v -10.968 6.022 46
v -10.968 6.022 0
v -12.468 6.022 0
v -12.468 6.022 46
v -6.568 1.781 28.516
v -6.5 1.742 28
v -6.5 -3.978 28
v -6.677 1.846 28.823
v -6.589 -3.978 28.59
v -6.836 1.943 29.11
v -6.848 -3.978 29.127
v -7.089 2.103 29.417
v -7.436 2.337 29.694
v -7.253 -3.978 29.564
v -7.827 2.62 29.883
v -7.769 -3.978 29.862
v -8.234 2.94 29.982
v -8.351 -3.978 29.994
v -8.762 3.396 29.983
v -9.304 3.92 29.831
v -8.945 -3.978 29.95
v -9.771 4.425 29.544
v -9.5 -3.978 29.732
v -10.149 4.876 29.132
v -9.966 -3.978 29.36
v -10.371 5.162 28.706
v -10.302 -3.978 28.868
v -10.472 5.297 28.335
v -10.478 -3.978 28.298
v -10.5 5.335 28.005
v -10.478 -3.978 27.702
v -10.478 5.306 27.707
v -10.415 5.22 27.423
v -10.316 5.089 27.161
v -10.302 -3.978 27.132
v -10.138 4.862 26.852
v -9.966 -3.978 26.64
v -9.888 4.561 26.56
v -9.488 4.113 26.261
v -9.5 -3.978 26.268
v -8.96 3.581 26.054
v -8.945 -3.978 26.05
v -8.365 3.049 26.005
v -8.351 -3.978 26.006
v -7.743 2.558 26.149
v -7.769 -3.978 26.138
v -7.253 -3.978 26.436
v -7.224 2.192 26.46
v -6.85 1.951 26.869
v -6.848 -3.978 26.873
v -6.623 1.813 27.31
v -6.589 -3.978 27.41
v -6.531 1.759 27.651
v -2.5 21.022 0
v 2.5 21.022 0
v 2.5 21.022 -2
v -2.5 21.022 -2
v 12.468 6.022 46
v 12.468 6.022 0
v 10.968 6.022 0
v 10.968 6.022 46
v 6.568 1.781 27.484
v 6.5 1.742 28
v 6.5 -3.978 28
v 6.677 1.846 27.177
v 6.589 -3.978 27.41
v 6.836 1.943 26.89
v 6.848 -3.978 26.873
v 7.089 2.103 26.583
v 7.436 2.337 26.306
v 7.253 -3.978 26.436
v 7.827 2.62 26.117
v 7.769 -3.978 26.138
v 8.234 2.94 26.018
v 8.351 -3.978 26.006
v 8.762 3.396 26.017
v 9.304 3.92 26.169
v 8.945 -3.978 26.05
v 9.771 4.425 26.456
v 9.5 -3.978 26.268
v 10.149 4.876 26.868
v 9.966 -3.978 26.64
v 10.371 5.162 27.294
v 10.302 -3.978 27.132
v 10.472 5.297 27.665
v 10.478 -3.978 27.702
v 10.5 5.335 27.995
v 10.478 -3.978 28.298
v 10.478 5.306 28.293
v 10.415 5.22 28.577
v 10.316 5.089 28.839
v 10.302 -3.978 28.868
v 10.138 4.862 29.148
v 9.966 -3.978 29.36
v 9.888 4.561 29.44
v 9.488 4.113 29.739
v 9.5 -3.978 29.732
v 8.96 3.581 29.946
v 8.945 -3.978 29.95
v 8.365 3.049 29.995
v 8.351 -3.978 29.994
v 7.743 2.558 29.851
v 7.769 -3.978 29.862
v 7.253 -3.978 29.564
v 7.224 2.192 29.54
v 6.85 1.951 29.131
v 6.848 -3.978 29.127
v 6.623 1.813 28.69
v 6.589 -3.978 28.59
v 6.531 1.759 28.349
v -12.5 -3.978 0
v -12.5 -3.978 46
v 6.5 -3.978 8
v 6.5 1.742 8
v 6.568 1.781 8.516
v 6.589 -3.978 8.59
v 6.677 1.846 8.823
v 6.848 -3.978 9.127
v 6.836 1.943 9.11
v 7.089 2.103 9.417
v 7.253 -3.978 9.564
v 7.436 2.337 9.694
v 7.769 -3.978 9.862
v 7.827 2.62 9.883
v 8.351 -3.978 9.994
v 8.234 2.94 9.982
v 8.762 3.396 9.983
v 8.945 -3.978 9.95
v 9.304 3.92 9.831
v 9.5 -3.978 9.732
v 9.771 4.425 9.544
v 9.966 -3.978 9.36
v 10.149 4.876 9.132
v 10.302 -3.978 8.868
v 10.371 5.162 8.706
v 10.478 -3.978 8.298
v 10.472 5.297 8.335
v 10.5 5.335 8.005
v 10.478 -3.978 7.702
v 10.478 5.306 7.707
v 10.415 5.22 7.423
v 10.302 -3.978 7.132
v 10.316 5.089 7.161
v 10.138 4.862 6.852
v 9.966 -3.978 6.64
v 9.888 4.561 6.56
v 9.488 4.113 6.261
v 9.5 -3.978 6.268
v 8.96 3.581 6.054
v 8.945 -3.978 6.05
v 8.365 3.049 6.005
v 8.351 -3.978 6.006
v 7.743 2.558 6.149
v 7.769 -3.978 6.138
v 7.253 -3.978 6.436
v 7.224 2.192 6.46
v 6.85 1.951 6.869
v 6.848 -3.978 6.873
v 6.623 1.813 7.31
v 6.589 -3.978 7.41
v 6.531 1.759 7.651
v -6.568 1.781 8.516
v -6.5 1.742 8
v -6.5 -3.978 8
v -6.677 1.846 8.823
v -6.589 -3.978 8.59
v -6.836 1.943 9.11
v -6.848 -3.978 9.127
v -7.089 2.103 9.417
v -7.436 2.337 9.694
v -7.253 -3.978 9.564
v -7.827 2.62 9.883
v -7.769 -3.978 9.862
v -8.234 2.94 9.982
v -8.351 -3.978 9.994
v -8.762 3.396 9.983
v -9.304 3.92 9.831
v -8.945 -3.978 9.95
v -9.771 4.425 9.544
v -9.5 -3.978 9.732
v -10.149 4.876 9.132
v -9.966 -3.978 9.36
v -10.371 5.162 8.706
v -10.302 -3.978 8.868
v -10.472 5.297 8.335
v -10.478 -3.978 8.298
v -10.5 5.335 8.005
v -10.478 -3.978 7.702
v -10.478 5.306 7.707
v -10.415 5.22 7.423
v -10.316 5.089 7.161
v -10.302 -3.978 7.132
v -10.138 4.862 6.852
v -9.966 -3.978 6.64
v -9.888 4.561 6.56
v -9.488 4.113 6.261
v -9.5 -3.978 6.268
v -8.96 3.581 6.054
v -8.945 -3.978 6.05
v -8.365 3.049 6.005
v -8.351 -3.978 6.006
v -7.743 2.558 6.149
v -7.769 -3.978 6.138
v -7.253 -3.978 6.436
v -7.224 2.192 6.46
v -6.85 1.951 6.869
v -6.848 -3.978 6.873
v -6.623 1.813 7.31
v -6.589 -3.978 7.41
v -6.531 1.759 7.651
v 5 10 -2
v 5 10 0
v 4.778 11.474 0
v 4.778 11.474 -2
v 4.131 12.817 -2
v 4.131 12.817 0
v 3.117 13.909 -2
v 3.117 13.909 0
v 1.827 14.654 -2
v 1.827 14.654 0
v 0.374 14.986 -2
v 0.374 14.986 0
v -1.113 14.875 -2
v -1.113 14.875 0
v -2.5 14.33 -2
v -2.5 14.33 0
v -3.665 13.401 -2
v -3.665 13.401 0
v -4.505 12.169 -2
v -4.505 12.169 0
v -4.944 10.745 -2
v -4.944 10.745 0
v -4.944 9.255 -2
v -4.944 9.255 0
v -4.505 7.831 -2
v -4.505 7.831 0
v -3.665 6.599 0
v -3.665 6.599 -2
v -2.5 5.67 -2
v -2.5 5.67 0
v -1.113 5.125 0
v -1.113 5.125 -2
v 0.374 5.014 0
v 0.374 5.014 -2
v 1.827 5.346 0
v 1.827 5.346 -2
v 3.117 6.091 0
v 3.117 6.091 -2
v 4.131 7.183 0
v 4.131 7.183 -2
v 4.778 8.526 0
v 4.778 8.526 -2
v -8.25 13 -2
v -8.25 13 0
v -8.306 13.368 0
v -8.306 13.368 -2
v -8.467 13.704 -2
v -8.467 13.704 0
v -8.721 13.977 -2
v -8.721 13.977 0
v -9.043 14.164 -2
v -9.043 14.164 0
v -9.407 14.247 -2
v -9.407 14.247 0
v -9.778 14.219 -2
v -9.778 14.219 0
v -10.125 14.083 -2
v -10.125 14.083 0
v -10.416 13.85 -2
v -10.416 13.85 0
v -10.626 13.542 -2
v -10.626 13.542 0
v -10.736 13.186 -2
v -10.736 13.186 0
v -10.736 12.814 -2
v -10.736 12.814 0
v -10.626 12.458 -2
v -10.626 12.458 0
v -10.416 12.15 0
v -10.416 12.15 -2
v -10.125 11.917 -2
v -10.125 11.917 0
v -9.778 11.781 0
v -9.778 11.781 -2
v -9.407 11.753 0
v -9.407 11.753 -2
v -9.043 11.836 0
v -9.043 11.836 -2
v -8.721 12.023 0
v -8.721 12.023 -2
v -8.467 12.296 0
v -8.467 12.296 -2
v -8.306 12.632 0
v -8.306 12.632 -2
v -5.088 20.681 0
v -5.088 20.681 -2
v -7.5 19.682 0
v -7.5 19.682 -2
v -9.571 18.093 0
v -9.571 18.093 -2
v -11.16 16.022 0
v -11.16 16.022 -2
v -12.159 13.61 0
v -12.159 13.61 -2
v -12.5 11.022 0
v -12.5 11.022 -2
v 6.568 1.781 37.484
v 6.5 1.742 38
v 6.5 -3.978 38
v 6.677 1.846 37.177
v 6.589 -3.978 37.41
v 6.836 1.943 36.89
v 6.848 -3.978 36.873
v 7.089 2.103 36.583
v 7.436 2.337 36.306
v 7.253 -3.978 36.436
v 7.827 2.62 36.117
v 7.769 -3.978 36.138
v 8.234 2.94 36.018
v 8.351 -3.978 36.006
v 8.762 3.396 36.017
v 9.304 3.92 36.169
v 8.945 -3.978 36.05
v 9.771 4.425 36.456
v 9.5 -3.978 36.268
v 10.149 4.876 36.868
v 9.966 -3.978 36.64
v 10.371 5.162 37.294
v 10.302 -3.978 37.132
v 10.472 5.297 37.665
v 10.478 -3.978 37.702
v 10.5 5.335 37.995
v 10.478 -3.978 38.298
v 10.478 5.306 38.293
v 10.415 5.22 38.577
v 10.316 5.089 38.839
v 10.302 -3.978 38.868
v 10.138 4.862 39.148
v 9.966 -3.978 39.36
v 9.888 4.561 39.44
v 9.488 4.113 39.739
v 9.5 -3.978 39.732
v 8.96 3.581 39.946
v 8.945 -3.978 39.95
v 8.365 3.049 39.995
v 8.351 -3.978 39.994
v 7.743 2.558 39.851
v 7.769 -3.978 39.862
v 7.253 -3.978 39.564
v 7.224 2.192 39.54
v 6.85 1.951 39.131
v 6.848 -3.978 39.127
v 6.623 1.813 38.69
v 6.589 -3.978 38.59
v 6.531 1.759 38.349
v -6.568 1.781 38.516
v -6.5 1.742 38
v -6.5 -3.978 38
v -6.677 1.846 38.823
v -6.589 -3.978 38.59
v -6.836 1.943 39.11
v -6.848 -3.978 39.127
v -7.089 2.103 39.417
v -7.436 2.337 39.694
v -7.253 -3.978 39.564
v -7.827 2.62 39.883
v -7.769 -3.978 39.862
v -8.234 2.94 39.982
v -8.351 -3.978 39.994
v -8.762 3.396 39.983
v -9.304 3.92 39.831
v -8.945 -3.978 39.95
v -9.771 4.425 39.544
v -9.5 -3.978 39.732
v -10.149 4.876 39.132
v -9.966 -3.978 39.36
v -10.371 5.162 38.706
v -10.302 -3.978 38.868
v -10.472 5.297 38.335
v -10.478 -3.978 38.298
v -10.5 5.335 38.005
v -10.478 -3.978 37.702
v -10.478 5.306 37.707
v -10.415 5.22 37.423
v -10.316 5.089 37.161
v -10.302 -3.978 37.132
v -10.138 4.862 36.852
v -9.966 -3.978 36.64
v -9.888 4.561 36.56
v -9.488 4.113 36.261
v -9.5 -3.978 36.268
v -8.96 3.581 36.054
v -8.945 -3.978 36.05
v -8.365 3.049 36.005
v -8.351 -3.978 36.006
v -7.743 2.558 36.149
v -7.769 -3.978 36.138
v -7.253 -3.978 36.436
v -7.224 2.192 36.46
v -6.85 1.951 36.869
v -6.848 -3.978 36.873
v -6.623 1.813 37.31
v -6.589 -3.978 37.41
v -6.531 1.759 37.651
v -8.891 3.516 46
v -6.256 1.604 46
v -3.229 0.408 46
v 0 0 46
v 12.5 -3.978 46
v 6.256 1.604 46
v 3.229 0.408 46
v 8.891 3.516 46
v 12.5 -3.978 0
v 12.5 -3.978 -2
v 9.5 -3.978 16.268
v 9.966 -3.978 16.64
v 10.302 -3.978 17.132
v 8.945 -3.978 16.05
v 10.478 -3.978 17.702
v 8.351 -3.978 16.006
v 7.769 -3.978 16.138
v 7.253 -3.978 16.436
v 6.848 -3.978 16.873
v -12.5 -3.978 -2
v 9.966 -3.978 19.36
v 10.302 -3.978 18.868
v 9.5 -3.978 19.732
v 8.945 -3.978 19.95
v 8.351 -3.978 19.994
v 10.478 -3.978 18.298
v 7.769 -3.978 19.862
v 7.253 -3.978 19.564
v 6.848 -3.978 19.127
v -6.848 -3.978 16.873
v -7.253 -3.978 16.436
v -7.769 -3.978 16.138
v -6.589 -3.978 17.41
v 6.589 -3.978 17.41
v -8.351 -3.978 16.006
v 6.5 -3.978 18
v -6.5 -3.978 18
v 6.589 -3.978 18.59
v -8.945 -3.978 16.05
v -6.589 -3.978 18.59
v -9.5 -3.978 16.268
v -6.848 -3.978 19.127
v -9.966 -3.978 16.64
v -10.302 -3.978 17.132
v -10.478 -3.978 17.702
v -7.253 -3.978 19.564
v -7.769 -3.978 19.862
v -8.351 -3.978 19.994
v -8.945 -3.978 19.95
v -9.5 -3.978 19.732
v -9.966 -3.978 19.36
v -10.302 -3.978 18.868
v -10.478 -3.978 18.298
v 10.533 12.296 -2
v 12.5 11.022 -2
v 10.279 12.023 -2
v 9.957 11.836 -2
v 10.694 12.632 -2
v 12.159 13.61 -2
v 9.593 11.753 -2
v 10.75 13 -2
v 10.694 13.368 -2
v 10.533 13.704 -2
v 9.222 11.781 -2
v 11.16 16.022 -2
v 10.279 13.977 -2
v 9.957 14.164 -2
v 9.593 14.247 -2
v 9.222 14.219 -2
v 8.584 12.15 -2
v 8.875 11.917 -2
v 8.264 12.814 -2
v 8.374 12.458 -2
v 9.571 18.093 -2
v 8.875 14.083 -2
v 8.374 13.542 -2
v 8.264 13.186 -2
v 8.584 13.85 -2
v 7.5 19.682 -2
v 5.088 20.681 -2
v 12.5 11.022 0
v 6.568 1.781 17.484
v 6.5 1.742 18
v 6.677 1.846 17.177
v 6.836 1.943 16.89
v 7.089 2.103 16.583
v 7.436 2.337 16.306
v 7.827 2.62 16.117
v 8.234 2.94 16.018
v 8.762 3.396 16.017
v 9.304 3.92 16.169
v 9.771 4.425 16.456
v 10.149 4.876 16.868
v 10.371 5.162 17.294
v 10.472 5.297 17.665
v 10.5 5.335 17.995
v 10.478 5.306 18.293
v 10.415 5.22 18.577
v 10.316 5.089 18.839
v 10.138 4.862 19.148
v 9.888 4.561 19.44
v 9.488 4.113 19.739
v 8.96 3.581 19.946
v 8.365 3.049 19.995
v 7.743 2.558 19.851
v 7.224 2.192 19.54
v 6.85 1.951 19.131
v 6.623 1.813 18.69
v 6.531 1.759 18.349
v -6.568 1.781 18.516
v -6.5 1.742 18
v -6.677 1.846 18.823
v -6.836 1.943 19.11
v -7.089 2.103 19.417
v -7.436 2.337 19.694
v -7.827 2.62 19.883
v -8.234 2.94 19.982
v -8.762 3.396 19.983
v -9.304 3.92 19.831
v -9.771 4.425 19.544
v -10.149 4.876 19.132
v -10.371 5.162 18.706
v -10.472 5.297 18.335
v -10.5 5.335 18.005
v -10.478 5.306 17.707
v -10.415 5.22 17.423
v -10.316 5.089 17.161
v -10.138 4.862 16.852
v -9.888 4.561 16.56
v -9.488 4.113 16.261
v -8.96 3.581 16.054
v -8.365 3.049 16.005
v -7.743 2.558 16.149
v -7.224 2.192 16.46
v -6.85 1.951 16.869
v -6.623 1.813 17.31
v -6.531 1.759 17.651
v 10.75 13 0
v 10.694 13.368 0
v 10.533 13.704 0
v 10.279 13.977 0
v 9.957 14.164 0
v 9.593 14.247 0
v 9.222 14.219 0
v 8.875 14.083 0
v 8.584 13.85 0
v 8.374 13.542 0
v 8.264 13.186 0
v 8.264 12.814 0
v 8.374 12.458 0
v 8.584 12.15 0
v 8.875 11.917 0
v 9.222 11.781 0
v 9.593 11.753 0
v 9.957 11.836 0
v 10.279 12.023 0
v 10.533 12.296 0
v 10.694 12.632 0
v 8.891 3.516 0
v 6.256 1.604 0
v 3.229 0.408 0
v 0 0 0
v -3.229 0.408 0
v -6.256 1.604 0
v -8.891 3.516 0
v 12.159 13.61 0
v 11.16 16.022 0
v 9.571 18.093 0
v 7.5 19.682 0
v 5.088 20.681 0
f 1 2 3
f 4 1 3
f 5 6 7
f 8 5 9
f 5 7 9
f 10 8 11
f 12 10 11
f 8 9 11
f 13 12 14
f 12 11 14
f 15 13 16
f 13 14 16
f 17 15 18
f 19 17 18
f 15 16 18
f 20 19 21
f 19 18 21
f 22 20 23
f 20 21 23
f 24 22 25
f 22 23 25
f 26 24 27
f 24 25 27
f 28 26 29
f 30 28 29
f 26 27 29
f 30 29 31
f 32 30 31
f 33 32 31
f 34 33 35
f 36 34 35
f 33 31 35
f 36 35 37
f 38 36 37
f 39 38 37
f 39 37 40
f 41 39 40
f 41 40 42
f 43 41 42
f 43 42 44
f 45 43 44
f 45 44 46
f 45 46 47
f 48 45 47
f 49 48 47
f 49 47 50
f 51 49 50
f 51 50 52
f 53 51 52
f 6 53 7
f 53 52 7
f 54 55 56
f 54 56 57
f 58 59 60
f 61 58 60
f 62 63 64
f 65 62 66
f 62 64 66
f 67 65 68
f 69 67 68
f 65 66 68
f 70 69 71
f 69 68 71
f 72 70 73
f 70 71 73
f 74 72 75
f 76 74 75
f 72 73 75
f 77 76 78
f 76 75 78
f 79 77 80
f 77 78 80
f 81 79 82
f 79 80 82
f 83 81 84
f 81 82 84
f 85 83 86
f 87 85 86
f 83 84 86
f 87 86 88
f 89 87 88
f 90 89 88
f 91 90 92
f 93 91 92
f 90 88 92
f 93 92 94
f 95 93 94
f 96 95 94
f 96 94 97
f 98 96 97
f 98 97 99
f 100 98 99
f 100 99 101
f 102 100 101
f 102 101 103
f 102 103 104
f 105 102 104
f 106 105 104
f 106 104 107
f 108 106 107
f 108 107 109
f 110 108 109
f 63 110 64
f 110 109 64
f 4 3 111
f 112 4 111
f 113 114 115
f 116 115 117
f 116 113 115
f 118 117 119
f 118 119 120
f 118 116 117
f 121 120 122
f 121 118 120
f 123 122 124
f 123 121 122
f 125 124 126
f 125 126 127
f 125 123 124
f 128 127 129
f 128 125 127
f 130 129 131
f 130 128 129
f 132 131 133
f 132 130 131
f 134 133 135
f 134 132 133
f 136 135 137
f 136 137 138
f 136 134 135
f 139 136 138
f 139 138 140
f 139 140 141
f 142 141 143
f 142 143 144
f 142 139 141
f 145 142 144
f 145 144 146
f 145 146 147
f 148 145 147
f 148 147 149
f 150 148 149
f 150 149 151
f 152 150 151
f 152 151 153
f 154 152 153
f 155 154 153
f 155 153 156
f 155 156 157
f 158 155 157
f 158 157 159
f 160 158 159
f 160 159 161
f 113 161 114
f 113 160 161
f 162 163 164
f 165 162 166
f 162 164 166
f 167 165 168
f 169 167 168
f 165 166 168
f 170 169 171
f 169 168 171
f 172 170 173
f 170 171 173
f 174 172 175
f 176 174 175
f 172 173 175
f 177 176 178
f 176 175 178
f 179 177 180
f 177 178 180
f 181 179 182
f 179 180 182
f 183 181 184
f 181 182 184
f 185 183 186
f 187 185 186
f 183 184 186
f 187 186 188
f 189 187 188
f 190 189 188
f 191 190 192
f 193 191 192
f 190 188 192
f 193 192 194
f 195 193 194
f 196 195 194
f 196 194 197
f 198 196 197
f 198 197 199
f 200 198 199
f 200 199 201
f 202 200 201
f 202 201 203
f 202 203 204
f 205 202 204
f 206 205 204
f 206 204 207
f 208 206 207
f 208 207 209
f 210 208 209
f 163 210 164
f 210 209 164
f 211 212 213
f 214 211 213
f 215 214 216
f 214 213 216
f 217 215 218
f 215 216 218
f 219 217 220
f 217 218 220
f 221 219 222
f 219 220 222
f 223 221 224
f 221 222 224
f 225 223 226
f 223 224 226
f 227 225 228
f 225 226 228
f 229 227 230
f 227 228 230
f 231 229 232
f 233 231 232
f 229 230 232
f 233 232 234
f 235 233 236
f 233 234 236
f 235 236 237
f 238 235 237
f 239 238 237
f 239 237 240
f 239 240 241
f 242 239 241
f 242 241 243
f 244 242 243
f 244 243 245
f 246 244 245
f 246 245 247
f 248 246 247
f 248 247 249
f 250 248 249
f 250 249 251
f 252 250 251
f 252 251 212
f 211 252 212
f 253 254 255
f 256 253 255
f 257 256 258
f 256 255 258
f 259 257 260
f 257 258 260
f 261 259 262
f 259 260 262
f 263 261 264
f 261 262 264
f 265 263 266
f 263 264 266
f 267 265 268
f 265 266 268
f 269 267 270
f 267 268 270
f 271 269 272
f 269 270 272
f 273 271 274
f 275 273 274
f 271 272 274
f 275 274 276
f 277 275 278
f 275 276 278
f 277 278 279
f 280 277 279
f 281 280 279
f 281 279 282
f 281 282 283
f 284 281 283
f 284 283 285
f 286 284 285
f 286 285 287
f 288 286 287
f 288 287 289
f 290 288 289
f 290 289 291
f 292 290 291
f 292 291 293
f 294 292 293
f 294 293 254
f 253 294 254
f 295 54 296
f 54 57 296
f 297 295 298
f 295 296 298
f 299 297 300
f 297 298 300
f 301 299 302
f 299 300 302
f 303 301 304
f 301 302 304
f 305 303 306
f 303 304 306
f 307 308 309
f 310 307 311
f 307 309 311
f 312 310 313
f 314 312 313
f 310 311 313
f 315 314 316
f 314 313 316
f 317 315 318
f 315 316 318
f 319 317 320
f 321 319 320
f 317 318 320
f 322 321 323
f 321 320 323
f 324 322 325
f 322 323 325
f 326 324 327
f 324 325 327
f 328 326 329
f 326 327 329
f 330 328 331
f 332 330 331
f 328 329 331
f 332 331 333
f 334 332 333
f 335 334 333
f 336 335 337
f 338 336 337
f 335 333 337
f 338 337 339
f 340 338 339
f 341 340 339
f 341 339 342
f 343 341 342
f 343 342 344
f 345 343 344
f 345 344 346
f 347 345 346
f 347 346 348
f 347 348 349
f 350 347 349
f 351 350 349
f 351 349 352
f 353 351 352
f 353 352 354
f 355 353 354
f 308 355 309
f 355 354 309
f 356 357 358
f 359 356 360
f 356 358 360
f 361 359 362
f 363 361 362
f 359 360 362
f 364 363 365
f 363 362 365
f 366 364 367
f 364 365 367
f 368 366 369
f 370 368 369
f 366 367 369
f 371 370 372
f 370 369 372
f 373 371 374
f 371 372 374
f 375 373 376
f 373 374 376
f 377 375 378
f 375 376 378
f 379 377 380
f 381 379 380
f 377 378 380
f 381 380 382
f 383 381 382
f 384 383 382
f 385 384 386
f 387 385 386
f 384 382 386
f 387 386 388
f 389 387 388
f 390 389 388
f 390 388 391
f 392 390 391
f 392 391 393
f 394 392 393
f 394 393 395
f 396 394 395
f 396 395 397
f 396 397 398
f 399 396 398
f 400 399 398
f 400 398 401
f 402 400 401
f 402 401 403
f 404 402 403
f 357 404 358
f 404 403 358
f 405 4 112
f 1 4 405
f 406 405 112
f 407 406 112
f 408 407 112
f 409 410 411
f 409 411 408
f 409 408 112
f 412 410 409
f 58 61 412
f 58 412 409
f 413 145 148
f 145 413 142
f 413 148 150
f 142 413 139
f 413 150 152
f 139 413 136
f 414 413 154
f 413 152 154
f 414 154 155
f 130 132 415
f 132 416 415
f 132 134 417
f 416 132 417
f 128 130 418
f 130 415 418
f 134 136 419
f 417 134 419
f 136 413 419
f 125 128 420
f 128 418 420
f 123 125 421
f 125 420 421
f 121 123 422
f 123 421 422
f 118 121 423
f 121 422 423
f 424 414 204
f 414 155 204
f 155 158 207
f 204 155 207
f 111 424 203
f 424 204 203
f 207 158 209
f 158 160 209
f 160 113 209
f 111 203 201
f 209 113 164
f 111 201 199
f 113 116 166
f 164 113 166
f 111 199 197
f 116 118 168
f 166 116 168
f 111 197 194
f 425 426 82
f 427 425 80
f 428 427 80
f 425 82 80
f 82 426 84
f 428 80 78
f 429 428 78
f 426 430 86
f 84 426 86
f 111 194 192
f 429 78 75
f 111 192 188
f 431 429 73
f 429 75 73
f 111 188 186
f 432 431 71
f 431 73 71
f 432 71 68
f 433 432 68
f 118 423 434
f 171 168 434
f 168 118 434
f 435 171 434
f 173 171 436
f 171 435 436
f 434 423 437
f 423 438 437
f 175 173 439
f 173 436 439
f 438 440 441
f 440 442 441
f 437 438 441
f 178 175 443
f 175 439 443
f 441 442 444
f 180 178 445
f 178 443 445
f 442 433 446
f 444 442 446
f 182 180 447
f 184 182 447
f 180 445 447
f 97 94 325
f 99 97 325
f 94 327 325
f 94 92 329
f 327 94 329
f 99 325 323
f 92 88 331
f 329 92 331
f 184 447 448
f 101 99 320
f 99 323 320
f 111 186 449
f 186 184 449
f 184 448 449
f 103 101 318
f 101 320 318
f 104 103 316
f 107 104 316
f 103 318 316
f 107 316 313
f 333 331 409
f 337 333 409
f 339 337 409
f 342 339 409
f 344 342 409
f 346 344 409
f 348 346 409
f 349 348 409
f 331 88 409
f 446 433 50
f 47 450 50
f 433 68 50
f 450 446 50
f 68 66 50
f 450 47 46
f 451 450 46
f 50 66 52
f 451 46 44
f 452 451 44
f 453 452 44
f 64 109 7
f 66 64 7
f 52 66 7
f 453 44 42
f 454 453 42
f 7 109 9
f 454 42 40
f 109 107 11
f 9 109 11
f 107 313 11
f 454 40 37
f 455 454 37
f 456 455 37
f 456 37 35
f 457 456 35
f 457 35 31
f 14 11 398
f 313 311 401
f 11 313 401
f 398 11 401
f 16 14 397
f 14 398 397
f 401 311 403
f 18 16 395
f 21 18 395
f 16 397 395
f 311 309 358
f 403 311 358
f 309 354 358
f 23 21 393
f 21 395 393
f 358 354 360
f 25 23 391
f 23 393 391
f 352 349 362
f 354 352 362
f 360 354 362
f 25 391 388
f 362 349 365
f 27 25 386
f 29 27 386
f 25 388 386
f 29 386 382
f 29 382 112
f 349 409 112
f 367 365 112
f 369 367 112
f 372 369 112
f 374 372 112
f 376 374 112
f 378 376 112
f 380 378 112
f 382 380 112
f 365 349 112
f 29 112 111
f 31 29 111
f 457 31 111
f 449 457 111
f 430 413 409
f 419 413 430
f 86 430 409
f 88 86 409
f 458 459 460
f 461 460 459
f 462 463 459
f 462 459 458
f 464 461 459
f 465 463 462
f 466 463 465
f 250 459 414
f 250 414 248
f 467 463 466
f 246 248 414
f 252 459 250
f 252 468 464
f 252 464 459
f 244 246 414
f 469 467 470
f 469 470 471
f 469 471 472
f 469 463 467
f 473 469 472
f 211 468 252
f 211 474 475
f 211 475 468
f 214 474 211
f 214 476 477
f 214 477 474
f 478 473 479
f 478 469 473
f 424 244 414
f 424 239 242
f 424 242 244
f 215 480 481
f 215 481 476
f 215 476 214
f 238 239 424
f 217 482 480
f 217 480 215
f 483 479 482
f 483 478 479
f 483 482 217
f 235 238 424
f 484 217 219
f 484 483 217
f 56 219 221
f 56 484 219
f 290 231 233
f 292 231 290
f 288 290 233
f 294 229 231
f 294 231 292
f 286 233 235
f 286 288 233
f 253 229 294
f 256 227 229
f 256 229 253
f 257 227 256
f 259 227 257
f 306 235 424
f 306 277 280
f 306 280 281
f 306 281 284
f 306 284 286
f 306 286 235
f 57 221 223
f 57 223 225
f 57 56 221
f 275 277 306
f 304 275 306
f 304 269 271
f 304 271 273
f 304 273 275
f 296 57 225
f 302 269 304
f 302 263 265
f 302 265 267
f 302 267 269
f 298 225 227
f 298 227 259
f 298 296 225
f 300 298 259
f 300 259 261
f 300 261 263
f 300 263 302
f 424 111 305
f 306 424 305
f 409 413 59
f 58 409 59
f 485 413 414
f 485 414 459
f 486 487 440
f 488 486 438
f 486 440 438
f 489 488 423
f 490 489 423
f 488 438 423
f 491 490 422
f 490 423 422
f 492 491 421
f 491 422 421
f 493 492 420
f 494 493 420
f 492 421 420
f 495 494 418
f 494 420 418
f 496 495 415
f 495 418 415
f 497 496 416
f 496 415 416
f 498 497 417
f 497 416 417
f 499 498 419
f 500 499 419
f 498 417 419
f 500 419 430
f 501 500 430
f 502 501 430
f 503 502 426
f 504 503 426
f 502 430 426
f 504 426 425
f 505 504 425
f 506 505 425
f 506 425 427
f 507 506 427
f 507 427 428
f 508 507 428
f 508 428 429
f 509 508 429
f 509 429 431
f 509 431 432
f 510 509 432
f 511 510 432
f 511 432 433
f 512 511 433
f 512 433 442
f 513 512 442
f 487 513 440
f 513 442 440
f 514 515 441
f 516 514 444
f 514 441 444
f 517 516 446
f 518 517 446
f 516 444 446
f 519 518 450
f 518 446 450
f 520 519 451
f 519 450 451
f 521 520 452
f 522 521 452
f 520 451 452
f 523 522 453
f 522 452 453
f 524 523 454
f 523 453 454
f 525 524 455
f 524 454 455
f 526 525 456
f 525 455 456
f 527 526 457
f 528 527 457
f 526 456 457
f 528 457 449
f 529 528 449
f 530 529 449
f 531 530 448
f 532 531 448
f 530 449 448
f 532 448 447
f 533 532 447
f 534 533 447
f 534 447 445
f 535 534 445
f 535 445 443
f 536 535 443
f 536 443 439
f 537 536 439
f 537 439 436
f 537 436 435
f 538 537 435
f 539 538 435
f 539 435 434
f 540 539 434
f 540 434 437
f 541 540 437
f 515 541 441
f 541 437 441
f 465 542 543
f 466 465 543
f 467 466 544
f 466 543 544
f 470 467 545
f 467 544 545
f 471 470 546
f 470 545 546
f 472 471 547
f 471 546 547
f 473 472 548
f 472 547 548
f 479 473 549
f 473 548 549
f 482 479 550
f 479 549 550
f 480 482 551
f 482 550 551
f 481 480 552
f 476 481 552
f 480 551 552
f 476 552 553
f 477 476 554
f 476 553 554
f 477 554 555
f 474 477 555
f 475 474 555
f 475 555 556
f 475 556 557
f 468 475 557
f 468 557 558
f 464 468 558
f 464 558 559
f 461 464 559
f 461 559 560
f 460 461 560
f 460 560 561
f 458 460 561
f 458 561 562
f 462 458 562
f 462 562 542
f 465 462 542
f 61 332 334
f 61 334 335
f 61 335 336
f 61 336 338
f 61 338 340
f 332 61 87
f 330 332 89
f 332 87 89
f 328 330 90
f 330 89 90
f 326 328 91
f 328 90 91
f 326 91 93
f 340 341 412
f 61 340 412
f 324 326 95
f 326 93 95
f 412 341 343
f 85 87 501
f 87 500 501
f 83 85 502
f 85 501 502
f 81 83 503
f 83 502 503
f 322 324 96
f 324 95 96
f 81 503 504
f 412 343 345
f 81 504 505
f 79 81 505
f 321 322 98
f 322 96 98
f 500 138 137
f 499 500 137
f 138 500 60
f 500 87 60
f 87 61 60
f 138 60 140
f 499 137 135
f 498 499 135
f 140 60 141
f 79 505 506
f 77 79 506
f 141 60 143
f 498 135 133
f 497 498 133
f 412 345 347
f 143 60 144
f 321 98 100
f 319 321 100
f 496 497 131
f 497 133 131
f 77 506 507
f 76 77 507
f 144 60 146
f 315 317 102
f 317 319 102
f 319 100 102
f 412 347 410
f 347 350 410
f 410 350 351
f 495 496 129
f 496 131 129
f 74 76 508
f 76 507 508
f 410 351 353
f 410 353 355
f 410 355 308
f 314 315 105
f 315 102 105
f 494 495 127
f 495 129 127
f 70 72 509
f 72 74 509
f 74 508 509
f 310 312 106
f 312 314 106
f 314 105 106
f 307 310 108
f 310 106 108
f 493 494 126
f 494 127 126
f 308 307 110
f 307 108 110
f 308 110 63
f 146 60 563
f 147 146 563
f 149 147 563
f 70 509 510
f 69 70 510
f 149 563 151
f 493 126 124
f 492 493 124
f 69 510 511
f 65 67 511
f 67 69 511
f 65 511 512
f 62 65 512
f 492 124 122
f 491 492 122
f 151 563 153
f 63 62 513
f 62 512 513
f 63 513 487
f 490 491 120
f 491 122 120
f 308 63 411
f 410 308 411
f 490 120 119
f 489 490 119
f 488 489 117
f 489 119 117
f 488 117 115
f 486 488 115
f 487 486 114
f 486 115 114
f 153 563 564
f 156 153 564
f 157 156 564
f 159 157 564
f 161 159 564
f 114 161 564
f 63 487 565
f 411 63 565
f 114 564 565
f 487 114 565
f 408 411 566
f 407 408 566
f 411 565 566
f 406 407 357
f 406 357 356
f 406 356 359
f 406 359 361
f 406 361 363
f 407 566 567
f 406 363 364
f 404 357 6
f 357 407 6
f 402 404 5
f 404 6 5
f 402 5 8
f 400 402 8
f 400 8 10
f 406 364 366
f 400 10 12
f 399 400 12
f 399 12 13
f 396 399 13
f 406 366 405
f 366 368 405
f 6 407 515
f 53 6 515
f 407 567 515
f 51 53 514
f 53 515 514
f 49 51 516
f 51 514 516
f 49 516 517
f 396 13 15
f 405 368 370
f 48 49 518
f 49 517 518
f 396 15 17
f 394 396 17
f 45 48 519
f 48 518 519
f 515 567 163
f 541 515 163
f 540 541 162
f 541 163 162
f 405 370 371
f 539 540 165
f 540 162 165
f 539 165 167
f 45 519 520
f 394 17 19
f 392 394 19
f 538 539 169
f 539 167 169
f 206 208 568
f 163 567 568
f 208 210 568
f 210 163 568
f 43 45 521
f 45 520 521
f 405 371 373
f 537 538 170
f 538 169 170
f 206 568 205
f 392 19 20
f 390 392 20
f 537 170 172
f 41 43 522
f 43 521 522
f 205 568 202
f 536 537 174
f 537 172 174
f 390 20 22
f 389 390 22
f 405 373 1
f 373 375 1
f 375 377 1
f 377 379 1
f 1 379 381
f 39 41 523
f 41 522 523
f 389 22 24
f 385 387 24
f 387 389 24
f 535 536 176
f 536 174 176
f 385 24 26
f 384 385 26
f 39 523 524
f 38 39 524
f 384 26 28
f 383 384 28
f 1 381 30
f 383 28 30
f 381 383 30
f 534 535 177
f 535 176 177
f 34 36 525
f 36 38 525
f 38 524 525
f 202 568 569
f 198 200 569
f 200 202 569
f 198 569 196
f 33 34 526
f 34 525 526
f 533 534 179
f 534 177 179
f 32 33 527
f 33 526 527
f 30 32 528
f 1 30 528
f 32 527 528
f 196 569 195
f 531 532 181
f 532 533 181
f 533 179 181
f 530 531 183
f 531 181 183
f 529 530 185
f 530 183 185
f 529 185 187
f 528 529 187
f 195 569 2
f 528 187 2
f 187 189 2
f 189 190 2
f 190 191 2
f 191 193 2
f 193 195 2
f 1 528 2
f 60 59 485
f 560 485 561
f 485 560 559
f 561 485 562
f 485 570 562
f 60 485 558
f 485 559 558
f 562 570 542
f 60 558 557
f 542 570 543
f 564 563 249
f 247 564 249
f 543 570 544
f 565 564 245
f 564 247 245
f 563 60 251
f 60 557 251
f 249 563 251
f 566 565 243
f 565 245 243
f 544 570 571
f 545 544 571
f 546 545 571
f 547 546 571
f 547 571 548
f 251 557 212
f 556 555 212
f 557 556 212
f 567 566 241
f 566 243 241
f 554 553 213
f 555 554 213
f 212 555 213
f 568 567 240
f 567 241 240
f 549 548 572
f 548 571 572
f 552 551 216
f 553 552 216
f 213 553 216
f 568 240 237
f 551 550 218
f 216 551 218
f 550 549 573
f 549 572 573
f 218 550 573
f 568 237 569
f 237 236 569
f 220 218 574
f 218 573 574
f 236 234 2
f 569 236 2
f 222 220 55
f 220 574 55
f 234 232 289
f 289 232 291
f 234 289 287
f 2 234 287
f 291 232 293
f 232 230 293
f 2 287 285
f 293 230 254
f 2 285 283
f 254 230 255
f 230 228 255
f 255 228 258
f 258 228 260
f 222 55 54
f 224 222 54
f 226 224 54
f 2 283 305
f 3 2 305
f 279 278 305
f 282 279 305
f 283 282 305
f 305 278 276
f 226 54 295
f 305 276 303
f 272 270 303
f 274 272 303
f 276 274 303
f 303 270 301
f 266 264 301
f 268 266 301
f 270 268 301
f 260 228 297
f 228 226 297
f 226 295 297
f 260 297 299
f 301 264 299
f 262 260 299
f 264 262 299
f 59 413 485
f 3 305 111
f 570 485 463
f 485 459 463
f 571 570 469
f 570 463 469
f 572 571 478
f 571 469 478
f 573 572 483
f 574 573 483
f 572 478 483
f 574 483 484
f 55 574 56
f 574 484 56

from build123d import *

# Parameters (mm, degrees)
BOSS_EXTRUDE1_DEPTH       = 46
SKETCH3_W                 = 25
SKETCH3_H                 = 25
BOSS_EXTRUDE2_DEPTH       = 2
SKETCH4_R                 = 1.25
SKETCH4_R_2               = 5
CUT_EXTRUDE1_DEPTH        = 3
FILLET1_R                 = 10
SKETCH5_R                 = 2
CUT_EXTRUDE2_DEPTH        = 26
LPATTERN1_COUNT           = 4
LPATTERN1_PITCH           = 10
LPATTERN1_COPY_1_SKETCH_R = 2
LPATTERN1_COPY_1_DEPTH    = 26
LPATTERN1_COPY_2_SKETCH_R = 2
LPATTERN1_COPY_2_DEPTH    = 26
LPATTERN1_COPY_3_SKETCH_R = 2
LPATTERN1_COPY_3_DEPTH    = 26


with BuildPart() as part:
    # Sketch2 → Boss-Extrude1 (new body)
    with BuildSketch(Plane.XY):
        with BuildLine():
            Line((-12.5, -3.978039328), (12.5, -3.978039328))
            Line((12.5, -3.978039328), (12.468421549, 6.021910812))
            Line((12.468421549, 6.021910812), (10.968421549, 6.021910812))
            ThreePointArc((10.968421549, 6.021910812), (0, 0), (-10.968421549, 6.021910812))
            Line((-10.968421549, 6.021910812), (-12.468421549, 6.021910812))
            Line((-12.468421549, 6.021910812), (-12.5, -3.978039328))
        make_face()
    extrude(amount=BOSS_EXTRUDE1_DEPTH)

    # Sketch3 → Boss-Extrude2 (add)
    with BuildSketch(Plane(origin=(0, 0, 0), x_dir=(-1, 0, 0), z_dir=(0, 0, -1))):
        with Locations((0, 8.521960672)):
            Rectangle(SKETCH3_W, SKETCH3_H)
    extrude(amount=BOSS_EXTRUDE2_DEPTH)

    # Sketch4 → Cut-Extrude1 (cut, through all)
    with BuildSketch(Plane.XY):
        with Locations((-9.5, 13)):
            Circle(SKETCH4_R)
        with Locations((9.5, 13)):
            Circle(SKETCH4_R)
        with Locations((0, 10)):
            Circle(SKETCH4_R_2)
    extrude(amount=-CUT_EXTRUDE1_DEPTH, mode=Mode.SUBTRACT)

    # Fillet1
    fillet1_edges = [part.edges().sort_by_distance(p)[0] for p in [
        (12.5, 21.021960672, -1),
        (-12.5, 21.021960672, -1),
    ]]
    fillet(fillet1_edges, radius=FILLET1_R)

    # Sketch5 → Cut-Extrude2 (cut, through all)
    with BuildSketch(Plane.XZ.offset(3.978039328)):
        with Locations((-8.5, 8)):
            Circle(SKETCH5_R)
    cut_extrude2 = extrude(amount=-CUT_EXTRUDE2_DEPTH, mode=Mode.SUBTRACT)

    # Mirror1: Cut-Extrude2 across plane
    add(cut_extrude2.mirror(Plane(origin=(0, 0, 0), x_dir=(0, 0, 1), z_dir=(1, 0, 0))), mode=Mode.SUBTRACT)

    # LPattern1: Cut-Extrude2 ×4
    with Locations(*[(0, 0, i * LPATTERN1_PITCH) for i in range(1, LPATTERN1_COUNT)]):
        add(cut_extrude2, mode=Mode.SUBTRACT)

    # LPattern1 copy 1 sketch → LPattern1 copy 1 (cut, through all)
    with BuildSketch(Plane(origin=(0, -3.978039328, 10), x_dir=(-1, 0, 0), z_dir=(0, -1, 0))):
        with Locations((-8.5, -8)):
            Circle(LPATTERN1_COPY_1_SKETCH_R)
    extrude(amount=-LPATTERN1_COPY_1_DEPTH, mode=Mode.SUBTRACT)

    # LPattern1 copy 2 sketch → LPattern1 copy 2 (cut, through all)
    with BuildSketch(Plane(origin=(0, -3.978039328, 20), x_dir=(-1, 0, 0), z_dir=(0, -1, 0))):
        with Locations((-8.5, -8)):
            Circle(LPATTERN1_COPY_2_SKETCH_R)
    extrude(amount=-LPATTERN1_COPY_2_DEPTH, mode=Mode.SUBTRACT)

    # LPattern1 copy 3 sketch → LPattern1 copy 3 (cut, through all)
    with BuildSketch(Plane(origin=(0, -3.978039328, 30), x_dir=(-1, 0, 0), z_dir=(0, -1, 0))):
        with Locations((-8.5, -8)):
            Circle(LPATTERN1_COPY_3_SKETCH_R)
    extrude(amount=-LPATTERN1_COPY_3_DEPTH, mode=Mode.SUBTRACT)


solid = part.part
